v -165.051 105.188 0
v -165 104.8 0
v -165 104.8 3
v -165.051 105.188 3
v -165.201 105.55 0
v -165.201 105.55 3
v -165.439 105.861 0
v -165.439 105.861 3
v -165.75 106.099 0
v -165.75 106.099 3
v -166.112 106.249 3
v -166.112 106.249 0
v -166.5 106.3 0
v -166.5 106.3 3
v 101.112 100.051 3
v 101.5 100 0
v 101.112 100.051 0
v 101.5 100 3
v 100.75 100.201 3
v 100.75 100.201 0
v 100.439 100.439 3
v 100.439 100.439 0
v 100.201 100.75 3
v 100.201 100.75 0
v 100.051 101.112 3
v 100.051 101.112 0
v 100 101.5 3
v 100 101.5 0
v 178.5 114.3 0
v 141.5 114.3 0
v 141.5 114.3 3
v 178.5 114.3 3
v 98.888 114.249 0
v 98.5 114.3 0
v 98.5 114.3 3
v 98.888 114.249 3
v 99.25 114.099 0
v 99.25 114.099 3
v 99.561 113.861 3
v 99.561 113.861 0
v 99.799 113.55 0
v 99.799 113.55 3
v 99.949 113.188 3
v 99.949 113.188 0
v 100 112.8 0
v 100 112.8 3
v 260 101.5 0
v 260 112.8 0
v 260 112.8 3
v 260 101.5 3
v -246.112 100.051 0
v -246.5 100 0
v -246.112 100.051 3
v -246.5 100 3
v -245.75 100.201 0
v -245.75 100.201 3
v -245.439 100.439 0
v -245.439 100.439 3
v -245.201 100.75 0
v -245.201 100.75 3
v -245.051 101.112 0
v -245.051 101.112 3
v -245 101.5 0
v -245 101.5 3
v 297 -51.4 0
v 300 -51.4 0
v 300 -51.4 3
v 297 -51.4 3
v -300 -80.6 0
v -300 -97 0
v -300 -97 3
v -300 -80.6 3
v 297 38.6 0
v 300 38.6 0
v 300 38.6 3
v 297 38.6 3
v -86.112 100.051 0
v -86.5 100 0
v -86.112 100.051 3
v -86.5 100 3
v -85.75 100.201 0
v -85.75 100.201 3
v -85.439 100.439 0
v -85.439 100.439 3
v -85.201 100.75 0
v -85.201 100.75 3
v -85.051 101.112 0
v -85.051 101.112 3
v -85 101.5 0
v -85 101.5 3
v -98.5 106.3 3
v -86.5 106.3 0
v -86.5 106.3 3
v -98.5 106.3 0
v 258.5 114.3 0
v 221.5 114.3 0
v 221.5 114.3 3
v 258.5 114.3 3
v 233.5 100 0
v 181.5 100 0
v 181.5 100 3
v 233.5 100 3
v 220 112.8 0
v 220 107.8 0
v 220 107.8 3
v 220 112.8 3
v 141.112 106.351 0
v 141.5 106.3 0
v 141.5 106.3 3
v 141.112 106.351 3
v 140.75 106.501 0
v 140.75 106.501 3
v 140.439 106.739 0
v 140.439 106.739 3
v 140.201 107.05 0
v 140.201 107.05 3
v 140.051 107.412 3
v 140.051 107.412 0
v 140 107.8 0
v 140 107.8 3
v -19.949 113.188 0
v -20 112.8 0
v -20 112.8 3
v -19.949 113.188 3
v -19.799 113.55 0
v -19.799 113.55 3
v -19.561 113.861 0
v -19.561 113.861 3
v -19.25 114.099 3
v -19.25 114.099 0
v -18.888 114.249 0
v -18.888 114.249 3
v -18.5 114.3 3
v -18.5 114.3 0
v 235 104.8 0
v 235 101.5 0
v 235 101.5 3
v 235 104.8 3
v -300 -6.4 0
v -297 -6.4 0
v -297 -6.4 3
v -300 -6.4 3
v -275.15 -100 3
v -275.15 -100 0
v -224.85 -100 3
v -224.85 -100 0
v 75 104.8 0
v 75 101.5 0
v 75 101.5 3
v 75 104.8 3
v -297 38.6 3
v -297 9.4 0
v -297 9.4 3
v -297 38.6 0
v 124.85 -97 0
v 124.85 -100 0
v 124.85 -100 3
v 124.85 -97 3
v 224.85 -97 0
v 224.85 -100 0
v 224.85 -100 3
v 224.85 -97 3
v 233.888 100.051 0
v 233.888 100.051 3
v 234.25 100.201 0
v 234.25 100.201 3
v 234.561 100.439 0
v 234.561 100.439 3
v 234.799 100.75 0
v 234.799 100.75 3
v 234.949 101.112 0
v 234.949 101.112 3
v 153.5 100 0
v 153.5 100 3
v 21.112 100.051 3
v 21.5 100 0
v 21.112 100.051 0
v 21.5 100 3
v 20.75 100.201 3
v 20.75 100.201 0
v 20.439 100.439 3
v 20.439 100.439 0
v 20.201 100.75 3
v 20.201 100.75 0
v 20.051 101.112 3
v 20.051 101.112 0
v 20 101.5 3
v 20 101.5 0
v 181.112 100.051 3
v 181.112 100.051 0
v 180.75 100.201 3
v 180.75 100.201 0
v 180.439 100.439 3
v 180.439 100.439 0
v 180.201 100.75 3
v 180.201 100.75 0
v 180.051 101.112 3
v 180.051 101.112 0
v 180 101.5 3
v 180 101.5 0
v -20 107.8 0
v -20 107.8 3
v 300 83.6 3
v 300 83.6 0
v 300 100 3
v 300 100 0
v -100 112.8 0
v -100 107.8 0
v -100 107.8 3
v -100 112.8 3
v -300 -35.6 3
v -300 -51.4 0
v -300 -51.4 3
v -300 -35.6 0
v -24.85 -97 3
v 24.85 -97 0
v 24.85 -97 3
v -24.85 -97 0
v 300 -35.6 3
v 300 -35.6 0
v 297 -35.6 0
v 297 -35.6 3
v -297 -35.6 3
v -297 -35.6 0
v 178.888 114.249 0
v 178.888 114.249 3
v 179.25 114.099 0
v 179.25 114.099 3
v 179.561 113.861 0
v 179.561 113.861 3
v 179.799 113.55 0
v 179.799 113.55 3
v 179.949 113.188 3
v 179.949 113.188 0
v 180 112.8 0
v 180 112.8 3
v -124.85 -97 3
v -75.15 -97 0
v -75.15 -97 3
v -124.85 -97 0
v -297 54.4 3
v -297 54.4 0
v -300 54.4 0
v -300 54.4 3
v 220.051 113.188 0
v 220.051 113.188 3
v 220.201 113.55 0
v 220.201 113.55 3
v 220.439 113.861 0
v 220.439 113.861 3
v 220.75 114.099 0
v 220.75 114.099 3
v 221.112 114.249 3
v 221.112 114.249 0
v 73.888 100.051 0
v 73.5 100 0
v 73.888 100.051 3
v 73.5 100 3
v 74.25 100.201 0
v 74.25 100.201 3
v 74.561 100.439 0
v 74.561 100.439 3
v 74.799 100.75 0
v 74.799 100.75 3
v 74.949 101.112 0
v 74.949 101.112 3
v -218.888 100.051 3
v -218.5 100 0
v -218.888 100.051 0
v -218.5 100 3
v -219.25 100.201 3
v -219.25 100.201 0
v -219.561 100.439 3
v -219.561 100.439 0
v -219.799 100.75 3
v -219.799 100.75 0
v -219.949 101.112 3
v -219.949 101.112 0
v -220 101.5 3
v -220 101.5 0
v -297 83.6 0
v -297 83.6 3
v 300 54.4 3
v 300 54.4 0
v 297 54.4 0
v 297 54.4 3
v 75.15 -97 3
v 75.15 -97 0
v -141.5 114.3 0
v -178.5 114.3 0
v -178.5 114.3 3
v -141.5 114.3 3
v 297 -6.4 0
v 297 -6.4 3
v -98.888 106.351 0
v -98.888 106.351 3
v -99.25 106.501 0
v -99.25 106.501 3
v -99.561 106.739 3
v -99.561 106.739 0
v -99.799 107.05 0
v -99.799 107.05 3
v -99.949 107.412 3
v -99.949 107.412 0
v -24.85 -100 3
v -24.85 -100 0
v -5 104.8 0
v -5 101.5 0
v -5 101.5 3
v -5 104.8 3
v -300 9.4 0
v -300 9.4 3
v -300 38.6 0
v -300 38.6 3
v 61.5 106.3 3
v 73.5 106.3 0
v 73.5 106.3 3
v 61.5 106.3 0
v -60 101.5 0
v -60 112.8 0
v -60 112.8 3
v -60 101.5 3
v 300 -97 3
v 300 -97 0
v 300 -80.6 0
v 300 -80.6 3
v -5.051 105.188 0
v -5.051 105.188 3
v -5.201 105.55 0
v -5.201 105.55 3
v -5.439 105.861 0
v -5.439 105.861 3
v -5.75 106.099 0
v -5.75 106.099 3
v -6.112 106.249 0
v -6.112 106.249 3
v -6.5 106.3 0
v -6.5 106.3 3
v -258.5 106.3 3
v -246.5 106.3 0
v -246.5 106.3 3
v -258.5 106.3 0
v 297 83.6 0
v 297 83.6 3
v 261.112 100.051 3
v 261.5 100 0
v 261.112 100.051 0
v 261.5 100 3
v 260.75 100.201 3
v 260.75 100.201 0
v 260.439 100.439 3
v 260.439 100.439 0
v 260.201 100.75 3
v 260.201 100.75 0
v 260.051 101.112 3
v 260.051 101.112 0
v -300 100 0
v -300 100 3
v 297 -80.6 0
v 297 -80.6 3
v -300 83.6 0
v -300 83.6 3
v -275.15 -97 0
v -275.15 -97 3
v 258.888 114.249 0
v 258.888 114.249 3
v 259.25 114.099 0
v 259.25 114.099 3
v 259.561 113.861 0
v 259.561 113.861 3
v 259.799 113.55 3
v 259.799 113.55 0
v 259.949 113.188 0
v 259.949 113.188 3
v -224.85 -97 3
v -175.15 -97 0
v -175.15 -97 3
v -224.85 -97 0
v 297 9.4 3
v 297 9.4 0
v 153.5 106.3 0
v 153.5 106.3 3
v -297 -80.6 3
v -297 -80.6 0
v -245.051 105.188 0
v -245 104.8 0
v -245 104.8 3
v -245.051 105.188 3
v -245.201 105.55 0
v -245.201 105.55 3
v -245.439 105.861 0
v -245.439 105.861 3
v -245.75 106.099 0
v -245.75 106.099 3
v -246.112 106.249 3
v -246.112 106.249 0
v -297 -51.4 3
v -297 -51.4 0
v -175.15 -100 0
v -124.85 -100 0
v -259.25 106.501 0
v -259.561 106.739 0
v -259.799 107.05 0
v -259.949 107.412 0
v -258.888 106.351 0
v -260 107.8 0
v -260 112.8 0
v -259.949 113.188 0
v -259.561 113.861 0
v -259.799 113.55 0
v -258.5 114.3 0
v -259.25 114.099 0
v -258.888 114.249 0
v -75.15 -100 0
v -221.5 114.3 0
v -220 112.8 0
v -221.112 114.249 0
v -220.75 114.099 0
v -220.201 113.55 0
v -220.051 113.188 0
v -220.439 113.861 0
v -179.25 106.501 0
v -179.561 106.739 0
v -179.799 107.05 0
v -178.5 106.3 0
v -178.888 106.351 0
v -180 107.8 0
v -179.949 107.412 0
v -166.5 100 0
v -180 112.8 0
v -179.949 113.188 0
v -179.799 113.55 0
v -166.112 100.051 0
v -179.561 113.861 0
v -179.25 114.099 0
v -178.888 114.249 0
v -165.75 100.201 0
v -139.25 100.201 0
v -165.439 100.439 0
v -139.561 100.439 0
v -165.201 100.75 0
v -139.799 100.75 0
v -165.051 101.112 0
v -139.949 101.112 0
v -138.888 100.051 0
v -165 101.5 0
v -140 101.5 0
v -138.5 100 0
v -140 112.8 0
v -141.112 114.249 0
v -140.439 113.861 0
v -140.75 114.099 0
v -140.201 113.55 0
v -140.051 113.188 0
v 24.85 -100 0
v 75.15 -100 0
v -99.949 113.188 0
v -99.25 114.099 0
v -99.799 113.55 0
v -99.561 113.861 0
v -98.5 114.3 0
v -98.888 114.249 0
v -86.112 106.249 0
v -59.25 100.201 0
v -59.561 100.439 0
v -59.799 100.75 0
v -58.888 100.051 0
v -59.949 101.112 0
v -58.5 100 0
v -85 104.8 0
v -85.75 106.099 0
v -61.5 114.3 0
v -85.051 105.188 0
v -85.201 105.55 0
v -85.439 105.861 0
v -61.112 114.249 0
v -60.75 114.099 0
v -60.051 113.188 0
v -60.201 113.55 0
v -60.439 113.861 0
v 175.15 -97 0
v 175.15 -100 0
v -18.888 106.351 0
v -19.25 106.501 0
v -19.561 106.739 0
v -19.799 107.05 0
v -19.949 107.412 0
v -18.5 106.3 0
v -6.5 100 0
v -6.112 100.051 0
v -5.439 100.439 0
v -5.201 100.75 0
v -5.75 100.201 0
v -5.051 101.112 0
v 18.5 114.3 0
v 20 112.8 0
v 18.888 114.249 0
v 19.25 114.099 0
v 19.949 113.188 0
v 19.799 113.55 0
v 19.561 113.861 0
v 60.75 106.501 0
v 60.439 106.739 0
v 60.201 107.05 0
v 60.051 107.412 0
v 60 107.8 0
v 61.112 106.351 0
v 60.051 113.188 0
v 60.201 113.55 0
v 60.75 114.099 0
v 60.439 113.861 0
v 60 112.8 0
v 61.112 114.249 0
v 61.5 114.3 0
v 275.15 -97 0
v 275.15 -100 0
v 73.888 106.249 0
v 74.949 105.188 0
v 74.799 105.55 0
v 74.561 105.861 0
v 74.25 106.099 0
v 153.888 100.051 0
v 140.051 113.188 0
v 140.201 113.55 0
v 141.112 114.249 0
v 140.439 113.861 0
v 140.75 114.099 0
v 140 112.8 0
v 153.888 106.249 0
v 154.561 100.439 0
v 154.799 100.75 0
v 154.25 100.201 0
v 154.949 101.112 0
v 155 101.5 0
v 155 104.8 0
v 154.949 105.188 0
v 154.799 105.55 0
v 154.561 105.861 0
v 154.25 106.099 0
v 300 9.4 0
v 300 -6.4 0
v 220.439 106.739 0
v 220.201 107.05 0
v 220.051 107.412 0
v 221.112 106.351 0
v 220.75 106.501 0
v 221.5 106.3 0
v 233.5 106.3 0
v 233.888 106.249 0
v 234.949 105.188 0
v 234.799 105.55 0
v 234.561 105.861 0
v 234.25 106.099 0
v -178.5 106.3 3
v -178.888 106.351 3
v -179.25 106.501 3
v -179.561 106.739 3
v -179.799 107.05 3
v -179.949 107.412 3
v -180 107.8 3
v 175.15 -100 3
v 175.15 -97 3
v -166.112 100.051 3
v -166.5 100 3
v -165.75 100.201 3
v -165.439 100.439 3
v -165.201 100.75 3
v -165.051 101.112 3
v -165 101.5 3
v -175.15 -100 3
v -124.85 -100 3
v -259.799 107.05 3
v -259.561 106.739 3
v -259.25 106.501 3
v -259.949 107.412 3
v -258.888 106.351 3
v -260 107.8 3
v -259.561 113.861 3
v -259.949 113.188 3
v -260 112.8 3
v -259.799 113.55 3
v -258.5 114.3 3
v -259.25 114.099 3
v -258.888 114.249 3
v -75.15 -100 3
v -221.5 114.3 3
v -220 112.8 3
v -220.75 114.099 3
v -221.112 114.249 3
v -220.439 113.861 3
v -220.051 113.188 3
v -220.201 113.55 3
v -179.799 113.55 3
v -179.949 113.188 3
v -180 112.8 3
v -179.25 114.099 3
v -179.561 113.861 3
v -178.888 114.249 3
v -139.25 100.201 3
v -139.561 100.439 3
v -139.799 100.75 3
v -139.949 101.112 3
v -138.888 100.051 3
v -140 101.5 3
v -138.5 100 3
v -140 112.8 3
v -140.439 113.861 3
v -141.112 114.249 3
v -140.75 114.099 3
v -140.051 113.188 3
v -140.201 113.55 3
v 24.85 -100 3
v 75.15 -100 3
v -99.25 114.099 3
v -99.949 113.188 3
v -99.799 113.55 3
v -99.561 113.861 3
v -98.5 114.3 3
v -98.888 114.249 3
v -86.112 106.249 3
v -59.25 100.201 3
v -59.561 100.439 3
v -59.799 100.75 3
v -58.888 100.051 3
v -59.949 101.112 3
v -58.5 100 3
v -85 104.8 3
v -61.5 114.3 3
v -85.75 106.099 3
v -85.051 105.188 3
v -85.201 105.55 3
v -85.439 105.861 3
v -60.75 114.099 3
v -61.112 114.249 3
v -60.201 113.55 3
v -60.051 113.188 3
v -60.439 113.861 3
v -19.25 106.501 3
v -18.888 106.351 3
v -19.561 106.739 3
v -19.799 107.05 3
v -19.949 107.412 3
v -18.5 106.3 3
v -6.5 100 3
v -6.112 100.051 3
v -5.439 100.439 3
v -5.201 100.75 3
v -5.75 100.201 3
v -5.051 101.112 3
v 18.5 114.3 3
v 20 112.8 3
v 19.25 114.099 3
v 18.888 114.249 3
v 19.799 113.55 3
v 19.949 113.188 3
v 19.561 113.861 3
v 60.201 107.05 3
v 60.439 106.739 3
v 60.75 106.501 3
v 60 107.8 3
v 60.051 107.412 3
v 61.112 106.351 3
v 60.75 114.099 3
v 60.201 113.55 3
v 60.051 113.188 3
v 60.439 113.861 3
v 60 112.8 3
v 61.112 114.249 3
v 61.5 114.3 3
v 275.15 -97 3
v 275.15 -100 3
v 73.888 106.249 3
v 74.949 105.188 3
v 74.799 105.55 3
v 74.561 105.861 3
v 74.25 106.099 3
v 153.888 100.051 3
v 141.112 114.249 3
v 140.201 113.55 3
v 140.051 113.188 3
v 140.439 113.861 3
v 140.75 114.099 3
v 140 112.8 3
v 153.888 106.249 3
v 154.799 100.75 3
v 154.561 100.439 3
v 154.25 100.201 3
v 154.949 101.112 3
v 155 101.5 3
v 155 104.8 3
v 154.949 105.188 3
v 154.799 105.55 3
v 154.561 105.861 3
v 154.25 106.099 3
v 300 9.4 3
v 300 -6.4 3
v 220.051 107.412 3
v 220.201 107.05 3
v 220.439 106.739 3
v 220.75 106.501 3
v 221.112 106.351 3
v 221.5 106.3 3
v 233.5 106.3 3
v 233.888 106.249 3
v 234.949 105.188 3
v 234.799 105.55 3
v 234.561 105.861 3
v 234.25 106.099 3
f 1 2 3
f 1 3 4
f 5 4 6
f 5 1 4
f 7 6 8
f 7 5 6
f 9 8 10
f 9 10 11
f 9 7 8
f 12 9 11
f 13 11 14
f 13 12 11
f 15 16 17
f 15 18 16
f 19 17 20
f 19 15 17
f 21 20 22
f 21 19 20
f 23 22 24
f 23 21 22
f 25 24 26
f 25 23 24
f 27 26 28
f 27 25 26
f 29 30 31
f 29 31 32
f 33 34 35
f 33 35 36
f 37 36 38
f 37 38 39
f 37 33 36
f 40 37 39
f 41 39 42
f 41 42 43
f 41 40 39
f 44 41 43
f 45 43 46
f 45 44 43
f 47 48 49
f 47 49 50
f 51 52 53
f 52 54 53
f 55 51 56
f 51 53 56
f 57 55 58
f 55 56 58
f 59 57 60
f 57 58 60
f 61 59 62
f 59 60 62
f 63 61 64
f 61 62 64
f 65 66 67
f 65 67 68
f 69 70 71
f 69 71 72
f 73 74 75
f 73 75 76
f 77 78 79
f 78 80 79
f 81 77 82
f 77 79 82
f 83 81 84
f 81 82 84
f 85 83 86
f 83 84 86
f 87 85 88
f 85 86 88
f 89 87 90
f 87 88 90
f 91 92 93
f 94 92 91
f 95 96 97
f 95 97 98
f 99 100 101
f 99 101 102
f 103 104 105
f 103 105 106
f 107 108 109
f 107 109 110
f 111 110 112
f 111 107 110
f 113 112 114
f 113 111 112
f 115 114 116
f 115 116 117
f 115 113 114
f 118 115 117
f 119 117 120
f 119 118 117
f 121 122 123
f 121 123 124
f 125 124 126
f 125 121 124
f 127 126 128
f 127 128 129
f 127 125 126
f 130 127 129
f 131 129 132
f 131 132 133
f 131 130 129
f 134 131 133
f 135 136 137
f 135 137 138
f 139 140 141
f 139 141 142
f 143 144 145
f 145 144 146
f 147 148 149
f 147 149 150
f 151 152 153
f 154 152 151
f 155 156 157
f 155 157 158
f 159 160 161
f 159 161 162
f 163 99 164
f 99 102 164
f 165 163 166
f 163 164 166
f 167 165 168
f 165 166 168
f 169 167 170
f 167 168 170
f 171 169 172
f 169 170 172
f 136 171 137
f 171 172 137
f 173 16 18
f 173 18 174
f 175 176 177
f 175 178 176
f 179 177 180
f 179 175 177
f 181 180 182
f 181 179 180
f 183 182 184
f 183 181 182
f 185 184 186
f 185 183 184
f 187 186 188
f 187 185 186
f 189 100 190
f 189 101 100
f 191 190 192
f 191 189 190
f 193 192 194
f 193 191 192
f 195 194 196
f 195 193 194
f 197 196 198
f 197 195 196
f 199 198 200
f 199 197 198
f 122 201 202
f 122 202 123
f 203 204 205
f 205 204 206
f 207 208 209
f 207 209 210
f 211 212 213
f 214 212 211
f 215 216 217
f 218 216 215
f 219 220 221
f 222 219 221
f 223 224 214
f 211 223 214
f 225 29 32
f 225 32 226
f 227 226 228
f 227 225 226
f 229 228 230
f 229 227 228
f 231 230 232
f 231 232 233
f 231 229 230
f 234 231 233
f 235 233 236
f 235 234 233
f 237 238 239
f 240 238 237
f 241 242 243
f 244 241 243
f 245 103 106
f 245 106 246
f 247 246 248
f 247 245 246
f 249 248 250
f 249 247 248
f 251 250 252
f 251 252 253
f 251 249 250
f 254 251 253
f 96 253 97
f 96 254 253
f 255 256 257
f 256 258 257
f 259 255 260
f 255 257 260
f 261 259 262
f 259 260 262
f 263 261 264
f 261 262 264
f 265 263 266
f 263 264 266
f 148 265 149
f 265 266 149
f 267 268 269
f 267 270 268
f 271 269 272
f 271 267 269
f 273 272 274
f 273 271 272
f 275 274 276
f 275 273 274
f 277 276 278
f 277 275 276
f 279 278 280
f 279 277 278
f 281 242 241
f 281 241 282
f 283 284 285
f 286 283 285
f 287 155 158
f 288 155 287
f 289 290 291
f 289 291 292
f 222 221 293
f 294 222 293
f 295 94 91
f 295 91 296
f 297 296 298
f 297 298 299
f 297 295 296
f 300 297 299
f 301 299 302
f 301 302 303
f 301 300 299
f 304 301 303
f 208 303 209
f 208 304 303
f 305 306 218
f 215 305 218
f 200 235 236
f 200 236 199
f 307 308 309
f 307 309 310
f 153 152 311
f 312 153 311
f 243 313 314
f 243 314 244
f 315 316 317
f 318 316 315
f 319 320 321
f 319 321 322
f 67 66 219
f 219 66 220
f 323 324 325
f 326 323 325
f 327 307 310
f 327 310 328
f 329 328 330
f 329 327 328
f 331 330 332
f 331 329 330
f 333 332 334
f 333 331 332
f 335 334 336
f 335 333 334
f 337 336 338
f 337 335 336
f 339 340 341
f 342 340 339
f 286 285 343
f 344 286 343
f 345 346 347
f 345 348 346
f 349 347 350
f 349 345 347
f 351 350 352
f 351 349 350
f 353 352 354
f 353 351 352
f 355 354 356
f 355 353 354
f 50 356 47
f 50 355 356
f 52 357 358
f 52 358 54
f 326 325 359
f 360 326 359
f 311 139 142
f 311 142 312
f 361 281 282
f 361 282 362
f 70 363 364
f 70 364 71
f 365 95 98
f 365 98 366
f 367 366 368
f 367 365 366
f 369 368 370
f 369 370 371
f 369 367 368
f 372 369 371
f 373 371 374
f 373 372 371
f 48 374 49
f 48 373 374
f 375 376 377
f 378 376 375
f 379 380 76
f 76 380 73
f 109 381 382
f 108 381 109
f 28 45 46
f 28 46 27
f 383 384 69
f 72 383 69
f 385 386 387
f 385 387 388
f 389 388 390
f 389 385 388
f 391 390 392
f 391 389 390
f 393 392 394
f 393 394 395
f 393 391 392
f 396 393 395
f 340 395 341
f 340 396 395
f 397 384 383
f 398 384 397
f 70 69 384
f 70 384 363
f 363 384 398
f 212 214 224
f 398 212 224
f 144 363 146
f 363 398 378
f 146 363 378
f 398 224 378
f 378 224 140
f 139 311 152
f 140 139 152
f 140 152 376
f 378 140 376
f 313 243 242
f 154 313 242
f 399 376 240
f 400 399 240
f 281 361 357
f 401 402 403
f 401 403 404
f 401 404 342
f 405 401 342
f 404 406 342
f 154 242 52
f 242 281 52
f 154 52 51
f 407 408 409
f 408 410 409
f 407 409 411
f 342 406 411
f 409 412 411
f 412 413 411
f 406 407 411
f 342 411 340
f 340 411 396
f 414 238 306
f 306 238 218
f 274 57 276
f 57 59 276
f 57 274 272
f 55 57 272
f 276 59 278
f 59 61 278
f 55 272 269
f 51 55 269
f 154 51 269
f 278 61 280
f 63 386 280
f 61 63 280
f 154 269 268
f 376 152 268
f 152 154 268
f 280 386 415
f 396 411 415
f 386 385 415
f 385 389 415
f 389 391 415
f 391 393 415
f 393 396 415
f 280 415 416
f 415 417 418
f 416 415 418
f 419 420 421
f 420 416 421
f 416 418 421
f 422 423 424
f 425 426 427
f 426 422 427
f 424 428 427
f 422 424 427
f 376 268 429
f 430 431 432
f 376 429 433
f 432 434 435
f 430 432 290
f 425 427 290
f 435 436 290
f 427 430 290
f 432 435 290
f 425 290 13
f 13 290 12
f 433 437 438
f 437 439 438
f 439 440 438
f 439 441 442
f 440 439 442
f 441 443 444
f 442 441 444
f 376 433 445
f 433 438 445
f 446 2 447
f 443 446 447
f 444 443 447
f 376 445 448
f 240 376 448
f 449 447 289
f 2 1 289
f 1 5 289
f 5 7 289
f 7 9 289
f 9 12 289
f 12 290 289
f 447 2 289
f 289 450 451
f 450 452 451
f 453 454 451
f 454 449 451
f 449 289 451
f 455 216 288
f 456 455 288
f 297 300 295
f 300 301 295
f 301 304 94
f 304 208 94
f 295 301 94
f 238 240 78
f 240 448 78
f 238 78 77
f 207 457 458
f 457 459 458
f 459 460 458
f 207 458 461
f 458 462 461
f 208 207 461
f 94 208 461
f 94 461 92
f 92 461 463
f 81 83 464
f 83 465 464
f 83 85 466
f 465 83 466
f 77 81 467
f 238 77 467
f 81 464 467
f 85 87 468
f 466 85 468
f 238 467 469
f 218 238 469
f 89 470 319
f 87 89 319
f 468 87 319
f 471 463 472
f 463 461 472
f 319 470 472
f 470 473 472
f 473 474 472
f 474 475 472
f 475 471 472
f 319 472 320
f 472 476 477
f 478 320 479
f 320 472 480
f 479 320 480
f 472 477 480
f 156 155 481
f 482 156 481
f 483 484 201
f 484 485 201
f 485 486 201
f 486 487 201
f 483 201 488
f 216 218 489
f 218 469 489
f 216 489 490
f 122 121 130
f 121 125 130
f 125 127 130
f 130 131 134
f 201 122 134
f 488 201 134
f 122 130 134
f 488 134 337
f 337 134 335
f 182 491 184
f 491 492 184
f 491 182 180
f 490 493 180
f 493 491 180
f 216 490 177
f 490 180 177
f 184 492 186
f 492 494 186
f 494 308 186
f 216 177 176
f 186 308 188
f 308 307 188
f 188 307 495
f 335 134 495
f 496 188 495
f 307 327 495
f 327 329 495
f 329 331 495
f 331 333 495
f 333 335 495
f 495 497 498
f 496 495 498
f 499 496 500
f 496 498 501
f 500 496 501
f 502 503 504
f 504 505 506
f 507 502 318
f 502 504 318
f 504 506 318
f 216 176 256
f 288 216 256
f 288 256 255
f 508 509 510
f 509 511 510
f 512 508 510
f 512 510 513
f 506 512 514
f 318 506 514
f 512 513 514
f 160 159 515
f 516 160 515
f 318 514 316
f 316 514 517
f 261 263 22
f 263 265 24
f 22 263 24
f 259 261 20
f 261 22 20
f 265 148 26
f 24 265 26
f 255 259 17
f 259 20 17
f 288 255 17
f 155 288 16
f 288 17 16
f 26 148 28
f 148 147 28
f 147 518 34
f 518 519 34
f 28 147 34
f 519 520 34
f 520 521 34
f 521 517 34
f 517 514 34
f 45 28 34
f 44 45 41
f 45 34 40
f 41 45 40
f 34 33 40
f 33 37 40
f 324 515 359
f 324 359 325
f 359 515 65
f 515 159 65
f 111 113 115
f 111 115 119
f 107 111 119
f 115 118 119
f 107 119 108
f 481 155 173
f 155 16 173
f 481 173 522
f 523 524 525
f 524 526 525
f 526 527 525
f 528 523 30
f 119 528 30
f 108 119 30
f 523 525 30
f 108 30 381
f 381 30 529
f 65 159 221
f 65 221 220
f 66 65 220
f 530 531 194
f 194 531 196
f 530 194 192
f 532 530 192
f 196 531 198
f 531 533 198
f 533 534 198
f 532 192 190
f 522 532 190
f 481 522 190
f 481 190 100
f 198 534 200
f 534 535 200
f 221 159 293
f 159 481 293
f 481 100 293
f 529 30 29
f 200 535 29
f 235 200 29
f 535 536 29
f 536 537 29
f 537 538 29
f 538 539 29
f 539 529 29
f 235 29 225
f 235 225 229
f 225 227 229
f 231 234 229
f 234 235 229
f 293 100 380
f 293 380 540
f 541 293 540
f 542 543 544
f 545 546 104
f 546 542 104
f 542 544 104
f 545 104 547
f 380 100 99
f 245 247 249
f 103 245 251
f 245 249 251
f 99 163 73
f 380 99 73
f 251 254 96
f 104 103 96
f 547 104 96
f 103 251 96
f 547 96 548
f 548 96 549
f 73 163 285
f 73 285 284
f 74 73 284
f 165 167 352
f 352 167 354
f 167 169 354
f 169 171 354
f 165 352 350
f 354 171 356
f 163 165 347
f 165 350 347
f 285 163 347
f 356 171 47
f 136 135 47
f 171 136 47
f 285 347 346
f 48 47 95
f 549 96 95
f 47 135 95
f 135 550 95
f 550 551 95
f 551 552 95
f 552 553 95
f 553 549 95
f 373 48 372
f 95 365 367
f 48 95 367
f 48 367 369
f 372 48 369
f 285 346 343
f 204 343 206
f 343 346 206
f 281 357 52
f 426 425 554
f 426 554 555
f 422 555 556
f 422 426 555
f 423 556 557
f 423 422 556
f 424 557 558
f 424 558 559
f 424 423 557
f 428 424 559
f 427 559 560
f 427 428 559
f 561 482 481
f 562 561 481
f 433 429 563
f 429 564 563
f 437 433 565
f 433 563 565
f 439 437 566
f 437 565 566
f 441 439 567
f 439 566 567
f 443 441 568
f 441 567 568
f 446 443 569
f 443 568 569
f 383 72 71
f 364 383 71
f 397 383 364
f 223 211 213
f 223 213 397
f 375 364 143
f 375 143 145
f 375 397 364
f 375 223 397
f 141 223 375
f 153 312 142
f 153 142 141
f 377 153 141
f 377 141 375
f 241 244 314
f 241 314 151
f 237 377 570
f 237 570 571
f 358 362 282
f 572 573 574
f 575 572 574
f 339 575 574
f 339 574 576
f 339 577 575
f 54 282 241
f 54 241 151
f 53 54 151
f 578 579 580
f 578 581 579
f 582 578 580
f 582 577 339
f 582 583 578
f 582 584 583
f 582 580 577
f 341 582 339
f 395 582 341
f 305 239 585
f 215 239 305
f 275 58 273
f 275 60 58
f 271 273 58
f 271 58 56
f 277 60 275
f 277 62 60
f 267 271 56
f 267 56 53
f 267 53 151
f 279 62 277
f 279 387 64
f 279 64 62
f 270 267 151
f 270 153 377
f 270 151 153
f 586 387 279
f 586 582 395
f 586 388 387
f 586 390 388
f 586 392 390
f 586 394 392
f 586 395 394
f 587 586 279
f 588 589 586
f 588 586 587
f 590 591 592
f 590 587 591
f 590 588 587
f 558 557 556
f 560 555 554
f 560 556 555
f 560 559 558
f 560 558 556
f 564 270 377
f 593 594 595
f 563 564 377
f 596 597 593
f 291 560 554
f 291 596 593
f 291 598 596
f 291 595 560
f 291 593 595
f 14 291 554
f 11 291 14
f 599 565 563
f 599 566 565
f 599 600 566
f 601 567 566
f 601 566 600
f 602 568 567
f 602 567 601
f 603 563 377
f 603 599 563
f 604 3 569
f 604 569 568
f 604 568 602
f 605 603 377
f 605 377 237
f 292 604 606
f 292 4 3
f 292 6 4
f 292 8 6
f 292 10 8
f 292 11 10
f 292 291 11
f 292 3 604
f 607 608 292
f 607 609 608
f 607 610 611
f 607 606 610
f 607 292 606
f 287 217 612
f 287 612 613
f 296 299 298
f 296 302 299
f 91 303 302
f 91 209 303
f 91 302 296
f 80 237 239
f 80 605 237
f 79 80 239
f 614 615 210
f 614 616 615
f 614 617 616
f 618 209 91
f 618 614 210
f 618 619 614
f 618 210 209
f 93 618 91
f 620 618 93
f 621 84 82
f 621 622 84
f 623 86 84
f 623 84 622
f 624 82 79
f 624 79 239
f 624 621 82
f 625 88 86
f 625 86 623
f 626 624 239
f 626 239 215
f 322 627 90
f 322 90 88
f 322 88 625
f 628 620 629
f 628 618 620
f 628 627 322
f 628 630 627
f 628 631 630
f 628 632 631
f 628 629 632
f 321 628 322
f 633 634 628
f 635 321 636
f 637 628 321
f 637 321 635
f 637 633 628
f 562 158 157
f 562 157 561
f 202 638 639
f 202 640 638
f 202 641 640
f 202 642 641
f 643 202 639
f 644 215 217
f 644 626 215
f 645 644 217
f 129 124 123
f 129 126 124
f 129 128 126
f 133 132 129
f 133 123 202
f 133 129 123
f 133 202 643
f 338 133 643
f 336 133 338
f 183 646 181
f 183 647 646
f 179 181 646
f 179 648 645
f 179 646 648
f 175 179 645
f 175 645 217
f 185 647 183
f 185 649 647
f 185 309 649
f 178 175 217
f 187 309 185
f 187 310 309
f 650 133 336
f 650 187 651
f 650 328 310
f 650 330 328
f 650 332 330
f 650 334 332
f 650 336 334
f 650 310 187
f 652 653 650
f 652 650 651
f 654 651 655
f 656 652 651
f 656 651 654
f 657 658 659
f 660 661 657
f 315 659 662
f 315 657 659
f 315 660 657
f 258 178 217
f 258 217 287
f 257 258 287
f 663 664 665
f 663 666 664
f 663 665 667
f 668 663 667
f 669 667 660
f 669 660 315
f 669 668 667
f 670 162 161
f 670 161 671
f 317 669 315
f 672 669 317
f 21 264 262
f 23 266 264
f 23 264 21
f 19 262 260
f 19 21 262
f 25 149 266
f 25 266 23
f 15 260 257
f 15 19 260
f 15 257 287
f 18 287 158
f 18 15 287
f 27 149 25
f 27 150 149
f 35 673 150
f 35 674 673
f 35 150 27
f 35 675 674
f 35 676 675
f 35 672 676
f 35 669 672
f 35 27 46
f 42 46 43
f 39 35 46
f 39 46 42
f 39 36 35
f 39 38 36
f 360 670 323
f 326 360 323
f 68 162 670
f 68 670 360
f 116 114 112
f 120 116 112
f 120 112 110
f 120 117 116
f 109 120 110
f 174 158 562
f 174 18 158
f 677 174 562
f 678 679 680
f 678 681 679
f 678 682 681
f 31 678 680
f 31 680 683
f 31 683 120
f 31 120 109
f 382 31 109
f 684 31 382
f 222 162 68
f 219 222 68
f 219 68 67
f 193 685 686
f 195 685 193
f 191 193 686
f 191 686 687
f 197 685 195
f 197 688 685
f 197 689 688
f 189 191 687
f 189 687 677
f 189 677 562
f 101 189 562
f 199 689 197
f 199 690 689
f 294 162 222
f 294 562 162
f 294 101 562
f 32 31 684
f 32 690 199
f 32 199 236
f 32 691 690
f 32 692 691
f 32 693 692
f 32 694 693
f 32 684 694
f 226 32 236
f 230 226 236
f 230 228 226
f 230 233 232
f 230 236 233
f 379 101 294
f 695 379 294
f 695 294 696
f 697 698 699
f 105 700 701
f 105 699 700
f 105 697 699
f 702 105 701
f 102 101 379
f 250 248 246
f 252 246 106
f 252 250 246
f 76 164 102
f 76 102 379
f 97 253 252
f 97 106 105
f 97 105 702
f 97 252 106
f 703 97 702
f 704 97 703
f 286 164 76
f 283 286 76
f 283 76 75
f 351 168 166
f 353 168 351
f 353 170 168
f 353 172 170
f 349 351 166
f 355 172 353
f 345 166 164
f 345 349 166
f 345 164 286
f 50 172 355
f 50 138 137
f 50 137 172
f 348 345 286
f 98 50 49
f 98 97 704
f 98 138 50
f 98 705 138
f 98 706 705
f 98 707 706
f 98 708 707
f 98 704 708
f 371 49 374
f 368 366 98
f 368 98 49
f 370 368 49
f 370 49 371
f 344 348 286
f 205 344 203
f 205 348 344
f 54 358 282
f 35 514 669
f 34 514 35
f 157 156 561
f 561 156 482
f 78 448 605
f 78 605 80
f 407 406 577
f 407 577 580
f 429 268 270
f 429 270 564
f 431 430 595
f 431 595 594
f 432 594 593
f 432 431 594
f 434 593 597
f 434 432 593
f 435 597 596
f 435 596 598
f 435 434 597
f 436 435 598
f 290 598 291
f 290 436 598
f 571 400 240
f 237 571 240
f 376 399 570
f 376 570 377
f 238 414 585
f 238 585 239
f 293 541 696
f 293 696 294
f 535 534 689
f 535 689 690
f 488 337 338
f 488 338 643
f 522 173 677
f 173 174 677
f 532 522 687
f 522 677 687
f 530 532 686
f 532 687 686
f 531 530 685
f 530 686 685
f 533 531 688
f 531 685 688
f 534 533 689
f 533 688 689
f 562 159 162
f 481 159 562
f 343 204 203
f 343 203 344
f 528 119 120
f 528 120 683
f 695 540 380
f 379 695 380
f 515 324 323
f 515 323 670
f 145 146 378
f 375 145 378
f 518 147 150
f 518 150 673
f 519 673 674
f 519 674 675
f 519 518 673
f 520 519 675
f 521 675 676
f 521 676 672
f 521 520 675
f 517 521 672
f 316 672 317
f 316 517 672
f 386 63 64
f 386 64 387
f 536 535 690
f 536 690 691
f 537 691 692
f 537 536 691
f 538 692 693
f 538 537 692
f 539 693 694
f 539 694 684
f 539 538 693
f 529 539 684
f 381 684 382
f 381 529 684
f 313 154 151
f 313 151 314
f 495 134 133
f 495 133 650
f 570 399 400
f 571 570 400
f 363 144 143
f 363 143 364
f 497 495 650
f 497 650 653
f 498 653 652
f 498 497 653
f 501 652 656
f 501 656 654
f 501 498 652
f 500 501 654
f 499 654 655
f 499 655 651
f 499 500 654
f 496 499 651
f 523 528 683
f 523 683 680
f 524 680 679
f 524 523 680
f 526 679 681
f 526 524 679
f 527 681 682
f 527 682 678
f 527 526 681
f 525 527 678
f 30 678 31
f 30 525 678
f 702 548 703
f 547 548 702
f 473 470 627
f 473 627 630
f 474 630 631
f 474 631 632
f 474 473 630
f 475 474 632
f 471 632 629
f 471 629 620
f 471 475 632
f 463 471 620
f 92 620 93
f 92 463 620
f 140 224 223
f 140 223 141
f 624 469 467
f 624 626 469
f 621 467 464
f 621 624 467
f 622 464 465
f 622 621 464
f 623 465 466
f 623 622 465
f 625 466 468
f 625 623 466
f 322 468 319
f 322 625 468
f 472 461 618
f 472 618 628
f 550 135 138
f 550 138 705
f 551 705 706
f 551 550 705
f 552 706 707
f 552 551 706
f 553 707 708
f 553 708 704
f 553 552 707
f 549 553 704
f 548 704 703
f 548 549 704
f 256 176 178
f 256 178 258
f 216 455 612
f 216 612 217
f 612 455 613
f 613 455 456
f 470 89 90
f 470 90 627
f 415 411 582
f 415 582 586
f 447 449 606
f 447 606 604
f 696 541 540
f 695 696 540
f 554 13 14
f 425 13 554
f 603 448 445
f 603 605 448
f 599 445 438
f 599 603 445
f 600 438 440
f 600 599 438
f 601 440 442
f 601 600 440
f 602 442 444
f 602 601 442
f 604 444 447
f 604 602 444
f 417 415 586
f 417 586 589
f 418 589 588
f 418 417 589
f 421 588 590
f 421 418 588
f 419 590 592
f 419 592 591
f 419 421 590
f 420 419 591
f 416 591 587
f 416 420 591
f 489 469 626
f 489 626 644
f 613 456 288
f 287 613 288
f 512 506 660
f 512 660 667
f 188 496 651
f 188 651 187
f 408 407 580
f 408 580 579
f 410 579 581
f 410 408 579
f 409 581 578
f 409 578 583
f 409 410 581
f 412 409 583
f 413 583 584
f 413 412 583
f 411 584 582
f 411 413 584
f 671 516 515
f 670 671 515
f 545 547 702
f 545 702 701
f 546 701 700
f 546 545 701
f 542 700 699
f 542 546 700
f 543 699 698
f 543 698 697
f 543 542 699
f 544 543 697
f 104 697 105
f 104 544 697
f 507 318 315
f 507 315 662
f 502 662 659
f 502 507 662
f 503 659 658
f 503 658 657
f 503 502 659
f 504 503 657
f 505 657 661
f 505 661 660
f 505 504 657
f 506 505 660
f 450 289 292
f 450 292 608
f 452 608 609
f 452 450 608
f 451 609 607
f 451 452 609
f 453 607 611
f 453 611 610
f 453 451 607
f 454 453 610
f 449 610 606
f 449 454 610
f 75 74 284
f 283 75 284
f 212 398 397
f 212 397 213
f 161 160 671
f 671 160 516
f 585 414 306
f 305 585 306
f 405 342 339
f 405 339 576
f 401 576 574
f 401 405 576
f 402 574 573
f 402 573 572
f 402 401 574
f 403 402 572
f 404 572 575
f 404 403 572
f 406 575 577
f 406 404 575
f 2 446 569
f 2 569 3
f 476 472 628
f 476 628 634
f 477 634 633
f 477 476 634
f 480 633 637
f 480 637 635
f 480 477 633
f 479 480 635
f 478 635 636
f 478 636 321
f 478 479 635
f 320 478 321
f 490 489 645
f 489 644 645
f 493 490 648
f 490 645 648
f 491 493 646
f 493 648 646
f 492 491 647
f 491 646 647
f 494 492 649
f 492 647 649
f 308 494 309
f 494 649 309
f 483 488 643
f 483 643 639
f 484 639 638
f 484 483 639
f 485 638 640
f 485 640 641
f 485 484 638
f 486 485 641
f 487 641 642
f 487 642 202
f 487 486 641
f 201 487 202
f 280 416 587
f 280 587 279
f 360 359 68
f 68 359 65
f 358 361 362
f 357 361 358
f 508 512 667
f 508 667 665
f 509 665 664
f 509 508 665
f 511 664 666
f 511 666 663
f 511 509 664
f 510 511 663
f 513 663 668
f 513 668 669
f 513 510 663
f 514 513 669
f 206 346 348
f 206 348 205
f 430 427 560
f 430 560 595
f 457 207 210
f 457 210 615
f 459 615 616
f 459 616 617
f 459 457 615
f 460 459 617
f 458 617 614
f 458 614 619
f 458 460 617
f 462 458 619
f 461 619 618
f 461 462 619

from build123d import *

# Parameters (mm, degrees)
CROQUIS1_W              = 600
CROQUIS1_H              = 200
SALIENTE_EXTRUIR1_DEPTH = 3
CROQUIS2_W              = 3
CROQUIS2_H              = 29.2
CROQUIS2_W_2            = 24.85
CROQUIS2_H_2            = 3
CROQUIS2_W_3            = 49.7
CORTAR_EXTRUIR1_DEPTH   = 4
SALIENTE_EXTRUIR2_DEPTH = 3
REDONDEO1_R             = 1.5


with BuildPart() as part:
    # Croquis1 → Saliente-Extruir1 (new body)
    with BuildSketch(Plane.XY):
        Rectangle(CROQUIS1_W, CROQUIS1_H)
    extrude(amount=SALIENTE_EXTRUIR1_DEPTH)

    # Croquis2 → Cortar-Extruir1 (cut, through all)
    with BuildSketch(Plane(origin=(0, 0, 0), x_dir=(-1, 0, 0), z_dir=(0, 0, -1))):
        with Locations((-298.5, 69)):
            Rectangle(CROQUIS2_W, CROQUIS2_H)
        with Locations((298.5, 69)):
            Rectangle(CROQUIS2_W, CROQUIS2_H)
        with Locations((-298.5, 24)):
            Rectangle(CROQUIS2_W, CROQUIS2_H)
        with Locations((298.5, 24)):
            Rectangle(CROQUIS2_W, CROQUIS2_H)
        with Locations((-298.5, -21)):
            Rectangle(CROQUIS2_W, CROQUIS2_H)
        with Locations((298.5, -21)):
            Rectangle(CROQUIS2_W, CROQUIS2_H)
        with Locations((-298.5, -66)):
            Rectangle(CROQUIS2_W, CROQUIS2_H)
        with Locations((298.5, -66)):
            Rectangle(CROQUIS2_W, CROQUIS2_H)
        with Locations((-287.575, -98.5)):
            Rectangle(CROQUIS2_W_2, CROQUIS2_H_2)
        with Locations((287.575, -98.5)):
            Rectangle(CROQUIS2_W_2, CROQUIS2_H_2)
        with Locations((-200, -98.5)):
            Rectangle(CROQUIS2_W_3, CROQUIS2_H_2)
        with Locations((200, -98.5)):
            Rectangle(CROQUIS2_W_3, CROQUIS2_H_2)
        with Locations((-100, -98.5)):
            Rectangle(CROQUIS2_W_3, CROQUIS2_H_2)
        with Locations((100, -98.5)):
            Rectangle(CROQUIS2_W_3, CROQUIS2_H_2)
        with Locations((0, -98.5)):
            Rectangle(CROQUIS2_W_3, CROQUIS2_H_2)
    extrude(amount=-CORTAR_EXTRUIR1_DEPTH, mode=Mode.SUBTRACT)

    # Croquis3 → Saliente-Extruir2 (add)
    with BuildSketch(Plane(origin=(0, 0, 0), x_dir=(-1, 0, 0), z_dir=(0, 0, -1))):
        with BuildLine():
            Line((-235, 100), (-235, 104.8))
            ThreePointArc((-235, 104.8), (-234.560660172, 105.860660172), (-233.5, 106.3))
            Line((-233.5, 106.3), (-221.5, 106.3))
            ThreePointArc((-221.5, 106.3), (-220.439339828, 106.739339828), (-220, 107.8))
            Line((-220, 107.8), (-220, 112.8))
            ThreePointArc((-220, 112.8), (-220.439339828, 113.860660172), (-221.5, 114.3))
            Line((-221.5, 114.3), (-258.5, 114.3))
            ThreePointArc((-258.5, 114.3), (-259.560660172, 113.860660172), (-260, 112.8))
            Line((-260, 112.8), (-260, 100))
            Line((-260, 100), (-235, 100))
        make_face()
        with BuildLine():
            Line((-180, 100), (-155, 100))
            Line((-155, 100), (-155, 104.8))
            ThreePointArc((-155, 104.8), (-154.560660172, 105.860660172), (-153.5, 106.3))
            Line((-153.5, 106.3), (-141.5, 106.3))
            ThreePointArc((-141.5, 106.3), (-140.439339828, 106.739339828), (-140, 107.8))
            Line((-140, 107.8), (-140, 112.8))
            ThreePointArc((-140, 112.8), (-140.439339828, 113.860660172), (-141.5, 114.3))
            Line((-141.5, 114.3), (-178.5, 114.3))
            ThreePointArc((-178.5, 114.3), (-179.560660172, 113.860660172), (-180, 112.8))
            Line((-180, 112.8), (-180, 100))
        make_face()
        with BuildLine():
            Line((-100, 100), (-75, 100))
            Line((-75, 100), (-75, 104.8))
            ThreePointArc((-75, 104.8), (-74.560660172, 105.860660172), (-73.5, 106.3))
            Line((-73.5, 106.3), (-61.5, 106.3))
            ThreePointArc((-61.5, 106.3), (-60.439339828, 106.739339828), (-60, 107.8))
            Line((-60, 107.8), (-60, 112.8))
            ThreePointArc((-60, 112.8), (-60.439339828, 113.860660172), (-61.5, 114.3))
            Line((-61.5, 114.3), (-98.5, 114.3))
            ThreePointArc((-98.5, 114.3), (-99.560660172, 113.860660172), (-100, 112.8))
            Line((-100, 112.8), (-100, 100))
        make_face()
        with BuildLine():
            Line((-20, 100), (5, 100))
            Line((5, 100), (5, 104.8))
            ThreePointArc((5, 104.8), (5.439339828, 105.860660172), (6.5, 106.3))
            Line((6.5, 106.3), (18.5, 106.3))
            ThreePointArc((18.5, 106.3), (19.560660172, 106.739339828), (20, 107.8))
            Line((20, 107.8), (20, 112.8))
            ThreePointArc((20, 112.8), (19.560660172, 113.860660172), (18.5, 114.3))
            Line((18.5, 114.3), (-18.5, 114.3))
            ThreePointArc((-18.5, 114.3), (-19.560660172, 113.860660172), (-20, 112.8))
            Line((-20, 112.8), (-20, 100))
        make_face()
        with BuildLine():
            Line((60, 100), (85, 100))
            Line((85, 100), (85, 104.8))
            ThreePointArc((85, 104.8), (85.439339828, 105.860660172), (86.5, 106.3))
            Line((86.5, 106.3), (98.5, 106.3))
            ThreePointArc((98.5, 106.3), (99.560660172, 106.739339828), (100, 107.8))
            Line((100, 107.8), (100, 112.8))
            ThreePointArc((100, 112.8), (99.560660172, 113.860660172), (98.5, 114.3))
            Line((98.5, 114.3), (61.5, 114.3))
            ThreePointArc((61.5, 114.3), (60.439339828, 113.860660172), (60, 112.8))
            Line((60, 112.8), (60, 100))
        make_face()
        with BuildLine():
            Line((140, 100), (165, 100))
            Line((165, 100), (165, 104.8))
            ThreePointArc((165, 104.8), (165.439339828, 105.860660172), (166.5, 106.3))
            Line((166.5, 106.3), (178.5, 106.3))
            ThreePointArc((178.5, 106.3), (179.560660172, 106.739339828), (180, 107.8))
            Line((180, 107.8), (180, 112.8))
            ThreePointArc((180, 112.8), (179.560660172, 113.860660172), (178.5, 114.3))
            Line((178.5, 114.3), (141.5, 114.3))
            ThreePointArc((141.5, 114.3), (140.439339828, 113.860660172), (140, 112.8))
            Line((140, 112.8), (140, 100))
        make_face()
        with BuildLine():
            Line((220, 100), (245, 100))
            Line((245, 100), (245, 104.8))
            ThreePointArc((245, 104.8), (245.439339828, 105.860660172), (246.5, 106.3))
            Line((246.5, 106.3), (258.5, 106.3))
            ThreePointArc((258.5, 106.3), (259.560660172, 106.739339828), (260, 107.8))
            Line((260, 107.8), (260, 112.8))
            ThreePointArc((260, 112.8), (259.560660172, 113.860660172), (258.5, 114.3))
            Line((258.5, 114.3), (221.5, 114.3))
            ThreePointArc((221.5, 114.3), (220.439339828, 113.860660172), (220, 112.8))
            Line((220, 112.8), (220, 100))
        make_face()
    extrude(amount=-SALIENTE_EXTRUIR2_DEPTH)

    # Redondeo1
    redondeo1_edges = [part.edges().sort_by_distance(p)[0] for p in [
        (235, 100, 1.5),
        (260, 100, 1.5),
        (155, 100, 1.5),
        (180, 100, 1.5),
        (75, 100, 1.5),
        (100, 100, 1.5),
        (-5, 100, 1.5),
        (20, 100, 1.5),
        (-85, 100, 1.5),
        (-60, 100, 1.5),
        (-165, 100, 1.5),
        (-140, 100, 1.5),
        (-245, 100, 1.5),
        (-220, 100, 1.5),
    ]]
    fillet(redondeo1_edges, radius=REDONDEO1_R)


solid = part.part
